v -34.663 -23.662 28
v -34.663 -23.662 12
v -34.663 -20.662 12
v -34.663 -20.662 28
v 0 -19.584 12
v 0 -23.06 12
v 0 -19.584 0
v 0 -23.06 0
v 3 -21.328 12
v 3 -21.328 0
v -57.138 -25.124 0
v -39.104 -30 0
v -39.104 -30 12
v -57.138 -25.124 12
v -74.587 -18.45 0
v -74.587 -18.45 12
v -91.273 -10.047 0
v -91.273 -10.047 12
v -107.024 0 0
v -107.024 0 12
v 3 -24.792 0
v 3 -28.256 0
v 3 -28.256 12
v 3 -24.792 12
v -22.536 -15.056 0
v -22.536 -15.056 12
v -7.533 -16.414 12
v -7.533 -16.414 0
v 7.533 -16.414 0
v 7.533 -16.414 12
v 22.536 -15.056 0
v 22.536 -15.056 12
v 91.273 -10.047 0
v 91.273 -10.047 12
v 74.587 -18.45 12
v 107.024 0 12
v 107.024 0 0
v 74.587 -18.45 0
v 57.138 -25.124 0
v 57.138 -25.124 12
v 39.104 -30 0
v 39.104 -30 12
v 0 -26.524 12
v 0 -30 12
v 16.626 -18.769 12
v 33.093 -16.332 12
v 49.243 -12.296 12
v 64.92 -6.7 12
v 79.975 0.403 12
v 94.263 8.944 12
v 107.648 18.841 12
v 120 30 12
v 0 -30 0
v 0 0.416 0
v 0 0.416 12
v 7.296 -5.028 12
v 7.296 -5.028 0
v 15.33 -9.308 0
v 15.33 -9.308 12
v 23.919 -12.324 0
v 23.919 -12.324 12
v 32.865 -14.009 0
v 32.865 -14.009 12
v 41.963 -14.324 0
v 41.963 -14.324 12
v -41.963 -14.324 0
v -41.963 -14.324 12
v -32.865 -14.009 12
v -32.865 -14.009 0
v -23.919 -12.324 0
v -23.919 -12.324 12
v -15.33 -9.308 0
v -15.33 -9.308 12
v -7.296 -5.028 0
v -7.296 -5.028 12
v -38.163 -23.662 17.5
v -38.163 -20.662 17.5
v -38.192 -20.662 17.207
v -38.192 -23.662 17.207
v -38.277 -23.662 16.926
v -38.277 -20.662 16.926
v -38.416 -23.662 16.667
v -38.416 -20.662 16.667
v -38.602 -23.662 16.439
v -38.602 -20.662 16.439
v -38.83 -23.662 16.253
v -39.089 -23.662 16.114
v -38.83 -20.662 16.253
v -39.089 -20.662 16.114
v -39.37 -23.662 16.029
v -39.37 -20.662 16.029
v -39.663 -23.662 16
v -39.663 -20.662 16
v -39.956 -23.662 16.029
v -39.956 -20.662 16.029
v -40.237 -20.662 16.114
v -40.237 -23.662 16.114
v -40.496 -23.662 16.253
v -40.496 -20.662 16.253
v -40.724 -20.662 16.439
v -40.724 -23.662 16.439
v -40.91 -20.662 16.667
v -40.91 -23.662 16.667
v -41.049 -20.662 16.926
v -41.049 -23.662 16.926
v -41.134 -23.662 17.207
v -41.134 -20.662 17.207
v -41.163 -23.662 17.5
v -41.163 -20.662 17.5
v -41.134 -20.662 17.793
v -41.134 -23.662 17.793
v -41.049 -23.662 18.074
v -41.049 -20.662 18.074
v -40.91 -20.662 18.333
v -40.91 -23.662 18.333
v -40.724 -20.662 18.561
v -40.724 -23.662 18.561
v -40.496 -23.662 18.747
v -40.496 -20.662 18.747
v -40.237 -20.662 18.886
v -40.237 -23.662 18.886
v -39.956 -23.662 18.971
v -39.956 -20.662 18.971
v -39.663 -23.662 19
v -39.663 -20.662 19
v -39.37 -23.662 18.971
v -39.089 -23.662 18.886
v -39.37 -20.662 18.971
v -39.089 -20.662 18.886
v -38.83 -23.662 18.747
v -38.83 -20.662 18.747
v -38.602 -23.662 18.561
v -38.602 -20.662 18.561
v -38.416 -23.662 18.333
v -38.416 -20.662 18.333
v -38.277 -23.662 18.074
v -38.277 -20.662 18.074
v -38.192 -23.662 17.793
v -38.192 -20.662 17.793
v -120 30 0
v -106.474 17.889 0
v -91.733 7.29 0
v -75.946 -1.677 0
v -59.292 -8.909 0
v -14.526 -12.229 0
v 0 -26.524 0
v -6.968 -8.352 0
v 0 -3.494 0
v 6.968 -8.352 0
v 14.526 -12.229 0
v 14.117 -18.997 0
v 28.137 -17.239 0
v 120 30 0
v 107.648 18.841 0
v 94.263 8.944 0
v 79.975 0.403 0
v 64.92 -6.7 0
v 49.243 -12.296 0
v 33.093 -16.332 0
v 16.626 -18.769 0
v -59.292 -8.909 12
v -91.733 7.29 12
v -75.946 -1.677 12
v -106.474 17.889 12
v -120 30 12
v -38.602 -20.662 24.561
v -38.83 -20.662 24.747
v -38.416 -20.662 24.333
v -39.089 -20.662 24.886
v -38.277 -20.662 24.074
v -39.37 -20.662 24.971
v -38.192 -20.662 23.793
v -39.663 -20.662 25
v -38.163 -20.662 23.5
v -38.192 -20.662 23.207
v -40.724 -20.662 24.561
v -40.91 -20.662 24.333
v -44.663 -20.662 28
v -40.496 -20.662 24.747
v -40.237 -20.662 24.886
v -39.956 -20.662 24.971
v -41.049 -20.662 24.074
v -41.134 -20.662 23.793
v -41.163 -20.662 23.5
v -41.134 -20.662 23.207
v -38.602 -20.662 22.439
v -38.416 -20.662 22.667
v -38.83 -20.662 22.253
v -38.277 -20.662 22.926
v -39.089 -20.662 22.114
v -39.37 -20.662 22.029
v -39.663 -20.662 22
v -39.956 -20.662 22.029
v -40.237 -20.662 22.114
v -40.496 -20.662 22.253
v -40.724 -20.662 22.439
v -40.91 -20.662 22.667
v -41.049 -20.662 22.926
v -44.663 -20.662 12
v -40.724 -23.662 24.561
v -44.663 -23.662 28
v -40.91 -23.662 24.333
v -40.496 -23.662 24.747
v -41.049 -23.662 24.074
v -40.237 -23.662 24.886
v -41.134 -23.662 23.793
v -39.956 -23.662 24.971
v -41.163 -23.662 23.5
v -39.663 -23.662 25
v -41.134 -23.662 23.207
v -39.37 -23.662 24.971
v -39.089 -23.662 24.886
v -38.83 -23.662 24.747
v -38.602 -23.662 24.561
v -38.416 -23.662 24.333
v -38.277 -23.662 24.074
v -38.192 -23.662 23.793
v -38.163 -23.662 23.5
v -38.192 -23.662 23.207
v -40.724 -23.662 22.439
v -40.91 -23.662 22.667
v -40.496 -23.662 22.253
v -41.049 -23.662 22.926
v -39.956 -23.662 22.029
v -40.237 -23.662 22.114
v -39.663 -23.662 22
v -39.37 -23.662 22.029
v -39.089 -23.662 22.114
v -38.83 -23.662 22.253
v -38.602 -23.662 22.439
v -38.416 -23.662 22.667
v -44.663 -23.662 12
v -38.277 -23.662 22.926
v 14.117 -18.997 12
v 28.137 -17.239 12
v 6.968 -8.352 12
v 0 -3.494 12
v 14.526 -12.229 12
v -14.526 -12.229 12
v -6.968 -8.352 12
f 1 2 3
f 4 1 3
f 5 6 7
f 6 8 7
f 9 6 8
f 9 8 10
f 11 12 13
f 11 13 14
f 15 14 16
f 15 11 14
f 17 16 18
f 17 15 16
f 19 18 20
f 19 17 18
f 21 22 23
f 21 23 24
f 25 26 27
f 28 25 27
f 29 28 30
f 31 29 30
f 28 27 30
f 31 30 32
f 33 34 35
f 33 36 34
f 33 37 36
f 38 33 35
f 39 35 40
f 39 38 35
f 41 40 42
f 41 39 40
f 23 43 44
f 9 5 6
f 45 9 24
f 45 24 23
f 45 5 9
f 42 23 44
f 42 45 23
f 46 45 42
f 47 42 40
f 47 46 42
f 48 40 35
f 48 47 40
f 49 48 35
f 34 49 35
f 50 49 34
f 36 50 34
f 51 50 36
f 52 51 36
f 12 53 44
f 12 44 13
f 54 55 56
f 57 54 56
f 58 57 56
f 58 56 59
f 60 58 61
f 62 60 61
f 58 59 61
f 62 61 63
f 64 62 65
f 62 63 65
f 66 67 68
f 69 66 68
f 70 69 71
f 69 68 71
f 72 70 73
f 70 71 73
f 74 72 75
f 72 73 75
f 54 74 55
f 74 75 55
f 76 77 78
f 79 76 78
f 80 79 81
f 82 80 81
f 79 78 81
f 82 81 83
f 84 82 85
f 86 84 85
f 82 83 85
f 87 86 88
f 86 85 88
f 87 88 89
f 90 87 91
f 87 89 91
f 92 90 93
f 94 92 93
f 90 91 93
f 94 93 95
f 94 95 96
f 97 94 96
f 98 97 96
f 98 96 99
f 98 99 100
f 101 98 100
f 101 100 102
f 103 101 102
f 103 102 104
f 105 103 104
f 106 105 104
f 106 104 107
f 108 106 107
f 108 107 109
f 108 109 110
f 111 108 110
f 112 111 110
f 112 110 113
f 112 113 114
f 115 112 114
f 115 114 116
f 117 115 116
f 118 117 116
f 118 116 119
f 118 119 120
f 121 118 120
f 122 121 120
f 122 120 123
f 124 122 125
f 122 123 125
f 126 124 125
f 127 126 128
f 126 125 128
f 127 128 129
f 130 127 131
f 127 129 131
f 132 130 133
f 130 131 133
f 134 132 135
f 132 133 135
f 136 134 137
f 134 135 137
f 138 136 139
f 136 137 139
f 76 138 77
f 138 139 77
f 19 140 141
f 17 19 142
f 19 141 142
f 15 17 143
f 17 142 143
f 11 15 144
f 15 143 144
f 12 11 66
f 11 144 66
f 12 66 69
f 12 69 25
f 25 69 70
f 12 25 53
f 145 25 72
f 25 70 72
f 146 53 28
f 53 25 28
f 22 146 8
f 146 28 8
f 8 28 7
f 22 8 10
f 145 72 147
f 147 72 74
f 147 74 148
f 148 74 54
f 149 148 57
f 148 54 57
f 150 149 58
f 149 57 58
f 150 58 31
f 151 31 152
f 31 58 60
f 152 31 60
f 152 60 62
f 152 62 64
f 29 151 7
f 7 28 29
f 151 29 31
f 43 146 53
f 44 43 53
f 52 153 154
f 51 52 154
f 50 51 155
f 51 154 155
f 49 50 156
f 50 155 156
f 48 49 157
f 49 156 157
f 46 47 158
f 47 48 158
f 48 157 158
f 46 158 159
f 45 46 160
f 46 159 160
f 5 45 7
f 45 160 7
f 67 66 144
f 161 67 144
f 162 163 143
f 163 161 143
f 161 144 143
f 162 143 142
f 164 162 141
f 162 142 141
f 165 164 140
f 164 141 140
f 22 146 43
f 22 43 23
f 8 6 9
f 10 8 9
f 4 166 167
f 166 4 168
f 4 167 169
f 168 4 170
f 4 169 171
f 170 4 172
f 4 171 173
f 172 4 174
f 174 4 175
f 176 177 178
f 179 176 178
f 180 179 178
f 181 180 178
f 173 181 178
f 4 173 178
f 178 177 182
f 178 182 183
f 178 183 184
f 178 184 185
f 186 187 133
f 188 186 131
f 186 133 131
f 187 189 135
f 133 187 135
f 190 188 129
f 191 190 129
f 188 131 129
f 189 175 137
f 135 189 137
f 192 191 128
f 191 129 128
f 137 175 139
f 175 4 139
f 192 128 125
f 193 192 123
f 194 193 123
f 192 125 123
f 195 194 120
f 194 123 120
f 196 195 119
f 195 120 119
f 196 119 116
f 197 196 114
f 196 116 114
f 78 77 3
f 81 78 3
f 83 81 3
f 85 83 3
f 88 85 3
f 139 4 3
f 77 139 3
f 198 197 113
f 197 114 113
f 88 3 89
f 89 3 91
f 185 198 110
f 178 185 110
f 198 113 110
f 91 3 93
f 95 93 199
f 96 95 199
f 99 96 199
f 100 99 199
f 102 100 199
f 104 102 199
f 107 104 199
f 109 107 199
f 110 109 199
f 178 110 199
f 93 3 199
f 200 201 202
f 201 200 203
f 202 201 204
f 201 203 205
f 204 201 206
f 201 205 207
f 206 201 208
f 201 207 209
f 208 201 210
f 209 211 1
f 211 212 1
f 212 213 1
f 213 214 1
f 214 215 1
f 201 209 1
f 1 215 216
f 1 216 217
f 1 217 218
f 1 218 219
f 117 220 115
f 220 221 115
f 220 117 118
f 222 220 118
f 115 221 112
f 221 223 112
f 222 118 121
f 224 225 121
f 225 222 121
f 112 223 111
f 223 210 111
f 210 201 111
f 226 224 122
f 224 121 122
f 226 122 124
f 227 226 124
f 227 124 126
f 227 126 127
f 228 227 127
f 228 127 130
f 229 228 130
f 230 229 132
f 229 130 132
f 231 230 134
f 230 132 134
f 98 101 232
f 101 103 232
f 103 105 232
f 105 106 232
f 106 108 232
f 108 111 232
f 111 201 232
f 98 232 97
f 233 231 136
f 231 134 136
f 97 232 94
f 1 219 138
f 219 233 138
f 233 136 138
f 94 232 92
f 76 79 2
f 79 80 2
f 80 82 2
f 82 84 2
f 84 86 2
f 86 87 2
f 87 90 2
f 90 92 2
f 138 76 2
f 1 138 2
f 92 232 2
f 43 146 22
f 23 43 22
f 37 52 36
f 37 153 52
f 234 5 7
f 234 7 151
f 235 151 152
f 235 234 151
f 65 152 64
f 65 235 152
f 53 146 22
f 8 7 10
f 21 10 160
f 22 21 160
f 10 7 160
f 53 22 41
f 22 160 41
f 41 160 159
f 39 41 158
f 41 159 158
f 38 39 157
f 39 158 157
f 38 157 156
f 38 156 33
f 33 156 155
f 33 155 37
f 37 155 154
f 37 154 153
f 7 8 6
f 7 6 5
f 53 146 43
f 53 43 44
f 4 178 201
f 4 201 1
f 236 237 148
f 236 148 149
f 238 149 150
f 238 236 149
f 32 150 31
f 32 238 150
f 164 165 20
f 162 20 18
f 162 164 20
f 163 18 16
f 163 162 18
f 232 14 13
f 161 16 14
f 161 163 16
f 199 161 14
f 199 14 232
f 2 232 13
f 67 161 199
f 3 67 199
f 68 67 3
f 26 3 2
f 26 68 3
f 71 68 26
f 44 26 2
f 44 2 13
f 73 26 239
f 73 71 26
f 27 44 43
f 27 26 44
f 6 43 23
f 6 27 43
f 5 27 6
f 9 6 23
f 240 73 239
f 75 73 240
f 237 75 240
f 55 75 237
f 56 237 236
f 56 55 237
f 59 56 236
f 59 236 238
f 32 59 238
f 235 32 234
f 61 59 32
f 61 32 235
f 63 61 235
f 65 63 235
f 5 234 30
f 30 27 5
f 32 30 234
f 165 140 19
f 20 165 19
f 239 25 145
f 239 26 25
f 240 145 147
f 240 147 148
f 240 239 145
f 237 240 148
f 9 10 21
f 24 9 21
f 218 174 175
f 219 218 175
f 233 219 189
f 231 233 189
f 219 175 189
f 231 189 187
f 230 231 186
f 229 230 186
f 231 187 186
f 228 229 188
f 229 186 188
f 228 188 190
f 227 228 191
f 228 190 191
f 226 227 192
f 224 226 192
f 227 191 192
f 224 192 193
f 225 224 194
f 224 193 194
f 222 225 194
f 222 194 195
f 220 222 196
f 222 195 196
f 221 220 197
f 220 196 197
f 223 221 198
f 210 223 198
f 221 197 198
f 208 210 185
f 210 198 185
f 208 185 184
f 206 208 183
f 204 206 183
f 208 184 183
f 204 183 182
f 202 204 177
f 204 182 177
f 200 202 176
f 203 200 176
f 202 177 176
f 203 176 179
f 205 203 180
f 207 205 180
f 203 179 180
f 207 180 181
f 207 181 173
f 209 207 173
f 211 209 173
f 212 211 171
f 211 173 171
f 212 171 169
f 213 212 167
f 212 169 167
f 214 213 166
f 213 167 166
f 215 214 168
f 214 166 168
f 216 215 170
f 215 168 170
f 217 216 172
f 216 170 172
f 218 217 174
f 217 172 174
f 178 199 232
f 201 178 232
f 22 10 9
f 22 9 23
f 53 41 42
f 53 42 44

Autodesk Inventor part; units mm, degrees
sketch "Эскиз1" plane through (0, 0, 0) normal (0, 0, 1) x (1, 0, 0)
  line L0 (39.103634, -30) -> (-39.103634, -30)
  line L1 (-120, 30) -> (120, -30) construction
  line L2 (120, 30) -> (-120, -30) construction
  line L3 (0, -30) -> (0, -27) construction
  arc A0 (-120, 30) -> (120, 30) centre (0, 150.415946) ccw
  arc A1 (-107.0236, 0) -> (-39.103634, -30) centre (0, 150.415946) ccw
  arc A2 (39.103634, -30) -> (107.0236, 0) centre (0, 150.415946) ccw
  line L4 (120, 30) -> (107.0236, 0)
  line L5 (-120, 30) -> (-107.0236, 0)
  point P0 (0, 0)
  dimension "d0" = 240
  dimension "d1" = 60
  dimension "d6" = 3
  dimension "d7" = 170
extrude "Выдавливание1" add sketch "Эскиз1" along normal blind 12
sketch "Эскиз2" plane through (0, 0, 12) normal (0, 0, 1) x (1, 0, 0)
  line L0 (-39.103634, -30) -> (39.103634, -30)
  line L1 (-39.103634, -30) -> (39.103634, -30) construction
  line L2 (0, -30) -> (10, -30) construction
  line L3 (0, -30) -> (-10, -30) construction
  arc A0 (-120, 30) -> (120, 30) centre (0, 150.415946) ccw
  line L4 (-120, 30) -> (-107.0236, 0)
  arc A1 (-107.0236, 0) -> (-39.103634, -30) centre (0, 150.415946) ccw
  arc A2 (39.103634, -30) -> (107.0236, 0) centre (0, 150.415946) ccw
  line L5 (107.0236, 0) -> (120, 30)
  point P0 (0, 0)
  point P1 (-12, -3)
  point P2 (12, -3)
  dimension "d4" = 10
  dimension "d5" = 10
sketch "Эскиз3" plane through (0, 0, 12) normal (0, 0, 1) x (1, 0, 0)
  line L0 (-39.103634, -30) -> (39.103634, -30) construction
  line L1 (0, -30) -> (0, -19.584054) construction
  arc A0 (-120, 30) -> (120, 30) centre (0, 150.415946) ccw construction
  line L2 (0, -24.792027) -> (-58.147862, -24.792027) construction
  arc A1 (-107.0236, 0) -> (-39.103634, -30) centre (0, 150.415946) ccw construction
  arc A2 (39.103634, -30) -> (107.0236, 0) centre (0, 150.415946) ccw construction
  line L3 (58.147862, -24.792027) -> (0, -24.792027) construction
  line L4 (0, -24.792027) -> (0, -27.792027)
  line L5 (0, -27.792027) -> (0, -21.792027)
  line L6 (0, -24.792027) -> (6, -24.792027) construction
  line L7 (0, -26.524078) -> (3, -28.256129)
  line L8 (0, -24.792027) -> (6.928203, -24.792027) construction
  line L9 (3, -28.256129) -> (3, -24.792027)
  line L10 (0, -23.059976) -> (3, -21.327925)
  line L11 (0, -24.792027) -> (6.928203, -24.792027) construction
  line L12 (3, -21.327925) -> (3, -24.792027)
  line L13 (0, -24.792027) -> (-3, -24.792027) construction
  line L14 (0, -23.059976) -> (0, -19.584054)
  line L15 (0, -26.524078) -> (0, -30)
  point P0 (0, 0)
  dimension "d8" = 3
  dimension "d9" = 6
  dimension "d10" = 6
  dimension "d11" = 30
  dimension "d12" = 30
  dimension "d13" = 3
sketch "Эскиз4" plane through (0, 0, 0) normal (0, 0, -1) x (-1, 0, 0)
  line L0 (-3, -28.256129) -> (-3, -24.792027)
  line L1 (0, -26.524078) -> (-3, -28.256129)
  line L2 (-3, -21.327925) -> (-3, -24.792027)
  line L3 (0, -23.059976) -> (-3, -21.327925)
  line L4 (0, -24.792027) -> (0, -27.792027)
  line L5 (0, -27.792027) -> (0, -21.792027)
  point P0 (0, 0)
ref_plane "РабПлоскость1" through (3, -21.327925, 12) normal (0.5, -0.8660254, 0) x (-0.8660254, -0.5, 0)
ref_plane "РабПлоскость2" through (3, -21.327925, 0) normal (-1, 0, 0) x (0, -1, 0)
ref_plane "РабПлоскость3" through (0, -26.524078, 12) normal (0.5, 0.8660254, 0) x (0.8660254, -0.5, 0)
ref_plane "РабПлоскость4" through (0, -19.584054, 12) normal (1, 0, 0) x (0, -1, 0)
ref_plane "РабПлоскость5" through (0, -26.524078, 0) normal (-1, 0, 0) x (0, -1, 0)
split body "Разделение1" sketch "Эскиз3" result two bodies curves L15 L7 L9 L12 L10 L14 first body at (-18.576653, -26.256352, 0.5)
sketch "Эскиз5" plane through (0, 0, 12) normal (0, 0, 1) x (1, 0, 0)
  line L0 (0, -19.584054) -> (0, -23.059976)
  arc A0 (-120, 30) -> (0, -19.584054) centre (0, 150.415946) ccw
  line L1 (-120, 30) -> (-107.0236, 0)
  arc A1 (-107.0236, 0) -> (-39.103634, -30) centre (0, 150.415946) ccw
  line L2 (-39.103634, -30) -> (0, -30)
  line L3 (0, -26.524078) -> (0, -30)
  line L4 (3, -28.256129) -> (0, -26.524078)
  line L5 (3, -21.327925) -> (3, -28.256129)
  line L6 (0, -23.059976) -> (3, -21.327925)
  line L7 (39.103634, -30) -> (0, -30)
  line L8 (0, -19.584054) -> (0, -23.059976)
  line L9 (0, -23.059976) -> (3, -21.327925)
  line L10 (3, -21.327925) -> (3, -28.256129)
  line L11 (3, -28.256129) -> (0, -26.524078)
  line L12 (0, -26.524078) -> (0, -30)
  line L13 (0, -30) -> (39.103634, -30)
  arc A2 (39.103634, -30) -> (107.0236, 0) centre (0, 150.415946) ccw
  line L14 (107.0236, 0) -> (120, 30)
  arc A3 (0, -19.584054) -> (120, 30) centre (0, 150.415946) ccw
  arc A4 (0, -19.584054) -> (120, 30) centre (0, 150.415946) ccw construction
  line L15 (0, -19.584054) -> (0, 0.415946) construction
  arc A5 (0, -19.584054) -> (120, 30) centre (0, 150.415946) ccw
  arc A6 (0, 0.415946) -> (41.962718, -14.323637) centre (39.482655, 45.718245) ccw
  arc A7 (-41.962718, -14.323637) -> (0, 0.415946) centre (-39.482655, 45.718245) ccw
  arc A8 (-41.962718, -14.323637) -> (41.962718, -14.323637) centre (0, 150.415946) ccw
  arc A9 (0, -3.494119) -> (22.536422, -15.056438) centre (39.482655, 45.718245) ccw
  arc A10 (-22.536422, -15.056438) -> (22.536422, -15.056438) centre (0, 150.415946) ccw
  arc A11 (-22.536422, -15.056438) -> (0, -3.494119) centre (-39.482655, 45.718245) ccw
  point P0 (0, 0)
  dimension "d15" = 20
  dimension "d18" = 3
extrude "Выдавливание2" add sketch "Эскиз5" against normal up to surface (12 mm away) contours A0 A7 A6 A3 bodies 2
sketch "Эскиз6" plane through (0, 0, 12) normal (0, 0, 1) x (1, 0, 0)
  arc A0 (-22.536422, -15.056438) -> (0, -3.494119) centre (-39.482655, 45.718245) ccw construction
  arc A1 (0, -3.494119) -> (22.536422, -15.056438) centre (39.482655, 45.718245) ccw construction
  arc A2 (-22.536422, -15.056438) -> (22.536422, -15.056438) centre (0, 150.415946) ccw construction
  line L0 (0, -19.584054) -> (0, -23.059976) construction
  arc A3 (0, -19.584054) -> (41.962718, -14.323637) centre (0, 150.415946) ccw construction
  arc A4 (0, 0.415946) -> (41.962718, -14.323637) centre (39.482655, 45.718245) ccw construction
  arc A5 (-41.962718, -14.323637) -> (0, 0.415946) centre (-39.482655, 45.718245) ccw construction
  arc A6 (-120, 30) -> (-41.962718, -14.323637) centre (0, 150.415946) ccw construction
  line L1 (-120, 30) -> (-107.0236, 0) construction
  arc A7 (-107.0236, 0) -> (-39.103634, -30) centre (0, 150.415946) ccw construction
  line L2 (-39.103634, -30) -> (0, -30) construction
  line L3 (0, -26.524078) -> (0, -30) construction
  line L4 (3, -28.256129) -> (0, -26.524078) construction
  line L5 (3, -21.327925) -> (3, -28.256129) construction
  line L6 (0, -23.059976) -> (3, -21.327925) construction
  line L7 (0, -19.584054) -> (0, -23.059976) construction
  line L8 (0, -23.059976) -> (3, -21.327925) construction
  line L9 (3, -21.327925) -> (3, -28.256129) construction
  line L10 (3, -28.256129) -> (0, -26.524078) construction
  line L11 (0, -26.524078) -> (0, -30) construction
  line L12 (0, -30) -> (39.103634, -30) construction
  arc A8 (39.103634, -30) -> (107.0236, 0) centre (0, 150.415946) ccw construction
  line L13 (107.0236, 0) -> (120, 30) construction
  arc A9 (0, -19.584054) -> (120, 30) centre (0, 150.415946) ccw construction
  line L14 (107.0236, 0) -> (-107.0236, 0) construction
  line L15 (0, -30) -> (-100, -30) construction
  line L16 (0, -30) -> (100, -30) construction
  line L17 (100, -30) -> (-34.663, -30) construction
  line L18 (-100, -30) -> (-44.663, -30) construction
  line L19 (-34.663, -30) -> (-44.663, -30) construction
  line L20 (-34.663, -31.5) -> (-44.663, -31.5) construction
  line L21 (-44.663, -31.5) -> (-44.663, -28.5) construction
  line L22 (-44.663, -28.5) -> (-34.663, -28.5) construction
  line L23 (-34.663, -28.5) -> (-34.663, -31.5) construction
  line L24 (-34.663, -31.5) -> (-44.663, -28.5) construction
  line L25 (-44.663, -31.5) -> (-34.663, -28.5) construction
  line L26 (-34.663, -30) -> (-34.663, -14.323637) construction
  line L27 (-44.663, -30) -> (-44.663, -13.612151) construction
  line L28 (-34.663, -22.161819) -> (-44.663, -22.161819) construction
  line L29 (-34.663, -20.661819) -> (-44.663, -20.661819)
  line L30 (-44.663, -20.661819) -> (-44.663, -23.661819)
  line L31 (-44.663, -23.661819) -> (-34.663, -23.661819)
  line L32 (-34.663, -23.661819) -> (-34.663, -20.661819)
  line L33 (-34.663, -20.661819) -> (-44.663, -23.661819) construction
  line L34 (-44.663, -20.661819) -> (-34.663, -23.661819) construction
  point P0 (0, 0)
  point P1 (-39.663, -30)
  point P2 (-39.663, -22.161819)
  dimension "d19" = 100
  dimension "d20" = 100
  dimension "d21" = 134.663
  dimension "d22" = 55.337
  dimension "d23" = 3
  dimension "d24" = 3
extrude "Выдавливание3" add sketch "Эскиз6" along normal blind 16 bodies 2
sketch "Эскиз7" plane through (-44.663, -20.661819, 12) normal (0, 1, 0) x (1, 0, 0)
  line L0 (0, 0) -> (10, 0) projected
  line L1 (0, 0) -> (0, -16) projected
  line L2 (10, -16) -> (0, -16) projected
  line L3 (10, 0) -> (10, -16) projected
  line L4 (0, 0) -> (0, -5.5) construction
  line L5 (0, 0) -> (0, -16) construction
  line L6 (0, -5.5) -> (10, -5.5) construction
  line L7 (5, -16) -> (5, 0) construction
  line L8 (0, 0) -> (10, 0) construction
  circle A0 centre (5, -5.5) radius 1.5
  line L9 (5, -5.5) -> (5, -11.5) construction
  circle A1 centre (5, -11.5) radius 1.5
  point P0 (44.663, 12)
  dimension "d27" = 5.5
  dimension "d28" = 3
  dimension "d29" = 6
  dimension "d30" = 3
extrude "Выдавливание4" cut sketch "Эскиз7" against normal blind 10 contours A0 | A1 bodies 2
properties part number "Kick"
